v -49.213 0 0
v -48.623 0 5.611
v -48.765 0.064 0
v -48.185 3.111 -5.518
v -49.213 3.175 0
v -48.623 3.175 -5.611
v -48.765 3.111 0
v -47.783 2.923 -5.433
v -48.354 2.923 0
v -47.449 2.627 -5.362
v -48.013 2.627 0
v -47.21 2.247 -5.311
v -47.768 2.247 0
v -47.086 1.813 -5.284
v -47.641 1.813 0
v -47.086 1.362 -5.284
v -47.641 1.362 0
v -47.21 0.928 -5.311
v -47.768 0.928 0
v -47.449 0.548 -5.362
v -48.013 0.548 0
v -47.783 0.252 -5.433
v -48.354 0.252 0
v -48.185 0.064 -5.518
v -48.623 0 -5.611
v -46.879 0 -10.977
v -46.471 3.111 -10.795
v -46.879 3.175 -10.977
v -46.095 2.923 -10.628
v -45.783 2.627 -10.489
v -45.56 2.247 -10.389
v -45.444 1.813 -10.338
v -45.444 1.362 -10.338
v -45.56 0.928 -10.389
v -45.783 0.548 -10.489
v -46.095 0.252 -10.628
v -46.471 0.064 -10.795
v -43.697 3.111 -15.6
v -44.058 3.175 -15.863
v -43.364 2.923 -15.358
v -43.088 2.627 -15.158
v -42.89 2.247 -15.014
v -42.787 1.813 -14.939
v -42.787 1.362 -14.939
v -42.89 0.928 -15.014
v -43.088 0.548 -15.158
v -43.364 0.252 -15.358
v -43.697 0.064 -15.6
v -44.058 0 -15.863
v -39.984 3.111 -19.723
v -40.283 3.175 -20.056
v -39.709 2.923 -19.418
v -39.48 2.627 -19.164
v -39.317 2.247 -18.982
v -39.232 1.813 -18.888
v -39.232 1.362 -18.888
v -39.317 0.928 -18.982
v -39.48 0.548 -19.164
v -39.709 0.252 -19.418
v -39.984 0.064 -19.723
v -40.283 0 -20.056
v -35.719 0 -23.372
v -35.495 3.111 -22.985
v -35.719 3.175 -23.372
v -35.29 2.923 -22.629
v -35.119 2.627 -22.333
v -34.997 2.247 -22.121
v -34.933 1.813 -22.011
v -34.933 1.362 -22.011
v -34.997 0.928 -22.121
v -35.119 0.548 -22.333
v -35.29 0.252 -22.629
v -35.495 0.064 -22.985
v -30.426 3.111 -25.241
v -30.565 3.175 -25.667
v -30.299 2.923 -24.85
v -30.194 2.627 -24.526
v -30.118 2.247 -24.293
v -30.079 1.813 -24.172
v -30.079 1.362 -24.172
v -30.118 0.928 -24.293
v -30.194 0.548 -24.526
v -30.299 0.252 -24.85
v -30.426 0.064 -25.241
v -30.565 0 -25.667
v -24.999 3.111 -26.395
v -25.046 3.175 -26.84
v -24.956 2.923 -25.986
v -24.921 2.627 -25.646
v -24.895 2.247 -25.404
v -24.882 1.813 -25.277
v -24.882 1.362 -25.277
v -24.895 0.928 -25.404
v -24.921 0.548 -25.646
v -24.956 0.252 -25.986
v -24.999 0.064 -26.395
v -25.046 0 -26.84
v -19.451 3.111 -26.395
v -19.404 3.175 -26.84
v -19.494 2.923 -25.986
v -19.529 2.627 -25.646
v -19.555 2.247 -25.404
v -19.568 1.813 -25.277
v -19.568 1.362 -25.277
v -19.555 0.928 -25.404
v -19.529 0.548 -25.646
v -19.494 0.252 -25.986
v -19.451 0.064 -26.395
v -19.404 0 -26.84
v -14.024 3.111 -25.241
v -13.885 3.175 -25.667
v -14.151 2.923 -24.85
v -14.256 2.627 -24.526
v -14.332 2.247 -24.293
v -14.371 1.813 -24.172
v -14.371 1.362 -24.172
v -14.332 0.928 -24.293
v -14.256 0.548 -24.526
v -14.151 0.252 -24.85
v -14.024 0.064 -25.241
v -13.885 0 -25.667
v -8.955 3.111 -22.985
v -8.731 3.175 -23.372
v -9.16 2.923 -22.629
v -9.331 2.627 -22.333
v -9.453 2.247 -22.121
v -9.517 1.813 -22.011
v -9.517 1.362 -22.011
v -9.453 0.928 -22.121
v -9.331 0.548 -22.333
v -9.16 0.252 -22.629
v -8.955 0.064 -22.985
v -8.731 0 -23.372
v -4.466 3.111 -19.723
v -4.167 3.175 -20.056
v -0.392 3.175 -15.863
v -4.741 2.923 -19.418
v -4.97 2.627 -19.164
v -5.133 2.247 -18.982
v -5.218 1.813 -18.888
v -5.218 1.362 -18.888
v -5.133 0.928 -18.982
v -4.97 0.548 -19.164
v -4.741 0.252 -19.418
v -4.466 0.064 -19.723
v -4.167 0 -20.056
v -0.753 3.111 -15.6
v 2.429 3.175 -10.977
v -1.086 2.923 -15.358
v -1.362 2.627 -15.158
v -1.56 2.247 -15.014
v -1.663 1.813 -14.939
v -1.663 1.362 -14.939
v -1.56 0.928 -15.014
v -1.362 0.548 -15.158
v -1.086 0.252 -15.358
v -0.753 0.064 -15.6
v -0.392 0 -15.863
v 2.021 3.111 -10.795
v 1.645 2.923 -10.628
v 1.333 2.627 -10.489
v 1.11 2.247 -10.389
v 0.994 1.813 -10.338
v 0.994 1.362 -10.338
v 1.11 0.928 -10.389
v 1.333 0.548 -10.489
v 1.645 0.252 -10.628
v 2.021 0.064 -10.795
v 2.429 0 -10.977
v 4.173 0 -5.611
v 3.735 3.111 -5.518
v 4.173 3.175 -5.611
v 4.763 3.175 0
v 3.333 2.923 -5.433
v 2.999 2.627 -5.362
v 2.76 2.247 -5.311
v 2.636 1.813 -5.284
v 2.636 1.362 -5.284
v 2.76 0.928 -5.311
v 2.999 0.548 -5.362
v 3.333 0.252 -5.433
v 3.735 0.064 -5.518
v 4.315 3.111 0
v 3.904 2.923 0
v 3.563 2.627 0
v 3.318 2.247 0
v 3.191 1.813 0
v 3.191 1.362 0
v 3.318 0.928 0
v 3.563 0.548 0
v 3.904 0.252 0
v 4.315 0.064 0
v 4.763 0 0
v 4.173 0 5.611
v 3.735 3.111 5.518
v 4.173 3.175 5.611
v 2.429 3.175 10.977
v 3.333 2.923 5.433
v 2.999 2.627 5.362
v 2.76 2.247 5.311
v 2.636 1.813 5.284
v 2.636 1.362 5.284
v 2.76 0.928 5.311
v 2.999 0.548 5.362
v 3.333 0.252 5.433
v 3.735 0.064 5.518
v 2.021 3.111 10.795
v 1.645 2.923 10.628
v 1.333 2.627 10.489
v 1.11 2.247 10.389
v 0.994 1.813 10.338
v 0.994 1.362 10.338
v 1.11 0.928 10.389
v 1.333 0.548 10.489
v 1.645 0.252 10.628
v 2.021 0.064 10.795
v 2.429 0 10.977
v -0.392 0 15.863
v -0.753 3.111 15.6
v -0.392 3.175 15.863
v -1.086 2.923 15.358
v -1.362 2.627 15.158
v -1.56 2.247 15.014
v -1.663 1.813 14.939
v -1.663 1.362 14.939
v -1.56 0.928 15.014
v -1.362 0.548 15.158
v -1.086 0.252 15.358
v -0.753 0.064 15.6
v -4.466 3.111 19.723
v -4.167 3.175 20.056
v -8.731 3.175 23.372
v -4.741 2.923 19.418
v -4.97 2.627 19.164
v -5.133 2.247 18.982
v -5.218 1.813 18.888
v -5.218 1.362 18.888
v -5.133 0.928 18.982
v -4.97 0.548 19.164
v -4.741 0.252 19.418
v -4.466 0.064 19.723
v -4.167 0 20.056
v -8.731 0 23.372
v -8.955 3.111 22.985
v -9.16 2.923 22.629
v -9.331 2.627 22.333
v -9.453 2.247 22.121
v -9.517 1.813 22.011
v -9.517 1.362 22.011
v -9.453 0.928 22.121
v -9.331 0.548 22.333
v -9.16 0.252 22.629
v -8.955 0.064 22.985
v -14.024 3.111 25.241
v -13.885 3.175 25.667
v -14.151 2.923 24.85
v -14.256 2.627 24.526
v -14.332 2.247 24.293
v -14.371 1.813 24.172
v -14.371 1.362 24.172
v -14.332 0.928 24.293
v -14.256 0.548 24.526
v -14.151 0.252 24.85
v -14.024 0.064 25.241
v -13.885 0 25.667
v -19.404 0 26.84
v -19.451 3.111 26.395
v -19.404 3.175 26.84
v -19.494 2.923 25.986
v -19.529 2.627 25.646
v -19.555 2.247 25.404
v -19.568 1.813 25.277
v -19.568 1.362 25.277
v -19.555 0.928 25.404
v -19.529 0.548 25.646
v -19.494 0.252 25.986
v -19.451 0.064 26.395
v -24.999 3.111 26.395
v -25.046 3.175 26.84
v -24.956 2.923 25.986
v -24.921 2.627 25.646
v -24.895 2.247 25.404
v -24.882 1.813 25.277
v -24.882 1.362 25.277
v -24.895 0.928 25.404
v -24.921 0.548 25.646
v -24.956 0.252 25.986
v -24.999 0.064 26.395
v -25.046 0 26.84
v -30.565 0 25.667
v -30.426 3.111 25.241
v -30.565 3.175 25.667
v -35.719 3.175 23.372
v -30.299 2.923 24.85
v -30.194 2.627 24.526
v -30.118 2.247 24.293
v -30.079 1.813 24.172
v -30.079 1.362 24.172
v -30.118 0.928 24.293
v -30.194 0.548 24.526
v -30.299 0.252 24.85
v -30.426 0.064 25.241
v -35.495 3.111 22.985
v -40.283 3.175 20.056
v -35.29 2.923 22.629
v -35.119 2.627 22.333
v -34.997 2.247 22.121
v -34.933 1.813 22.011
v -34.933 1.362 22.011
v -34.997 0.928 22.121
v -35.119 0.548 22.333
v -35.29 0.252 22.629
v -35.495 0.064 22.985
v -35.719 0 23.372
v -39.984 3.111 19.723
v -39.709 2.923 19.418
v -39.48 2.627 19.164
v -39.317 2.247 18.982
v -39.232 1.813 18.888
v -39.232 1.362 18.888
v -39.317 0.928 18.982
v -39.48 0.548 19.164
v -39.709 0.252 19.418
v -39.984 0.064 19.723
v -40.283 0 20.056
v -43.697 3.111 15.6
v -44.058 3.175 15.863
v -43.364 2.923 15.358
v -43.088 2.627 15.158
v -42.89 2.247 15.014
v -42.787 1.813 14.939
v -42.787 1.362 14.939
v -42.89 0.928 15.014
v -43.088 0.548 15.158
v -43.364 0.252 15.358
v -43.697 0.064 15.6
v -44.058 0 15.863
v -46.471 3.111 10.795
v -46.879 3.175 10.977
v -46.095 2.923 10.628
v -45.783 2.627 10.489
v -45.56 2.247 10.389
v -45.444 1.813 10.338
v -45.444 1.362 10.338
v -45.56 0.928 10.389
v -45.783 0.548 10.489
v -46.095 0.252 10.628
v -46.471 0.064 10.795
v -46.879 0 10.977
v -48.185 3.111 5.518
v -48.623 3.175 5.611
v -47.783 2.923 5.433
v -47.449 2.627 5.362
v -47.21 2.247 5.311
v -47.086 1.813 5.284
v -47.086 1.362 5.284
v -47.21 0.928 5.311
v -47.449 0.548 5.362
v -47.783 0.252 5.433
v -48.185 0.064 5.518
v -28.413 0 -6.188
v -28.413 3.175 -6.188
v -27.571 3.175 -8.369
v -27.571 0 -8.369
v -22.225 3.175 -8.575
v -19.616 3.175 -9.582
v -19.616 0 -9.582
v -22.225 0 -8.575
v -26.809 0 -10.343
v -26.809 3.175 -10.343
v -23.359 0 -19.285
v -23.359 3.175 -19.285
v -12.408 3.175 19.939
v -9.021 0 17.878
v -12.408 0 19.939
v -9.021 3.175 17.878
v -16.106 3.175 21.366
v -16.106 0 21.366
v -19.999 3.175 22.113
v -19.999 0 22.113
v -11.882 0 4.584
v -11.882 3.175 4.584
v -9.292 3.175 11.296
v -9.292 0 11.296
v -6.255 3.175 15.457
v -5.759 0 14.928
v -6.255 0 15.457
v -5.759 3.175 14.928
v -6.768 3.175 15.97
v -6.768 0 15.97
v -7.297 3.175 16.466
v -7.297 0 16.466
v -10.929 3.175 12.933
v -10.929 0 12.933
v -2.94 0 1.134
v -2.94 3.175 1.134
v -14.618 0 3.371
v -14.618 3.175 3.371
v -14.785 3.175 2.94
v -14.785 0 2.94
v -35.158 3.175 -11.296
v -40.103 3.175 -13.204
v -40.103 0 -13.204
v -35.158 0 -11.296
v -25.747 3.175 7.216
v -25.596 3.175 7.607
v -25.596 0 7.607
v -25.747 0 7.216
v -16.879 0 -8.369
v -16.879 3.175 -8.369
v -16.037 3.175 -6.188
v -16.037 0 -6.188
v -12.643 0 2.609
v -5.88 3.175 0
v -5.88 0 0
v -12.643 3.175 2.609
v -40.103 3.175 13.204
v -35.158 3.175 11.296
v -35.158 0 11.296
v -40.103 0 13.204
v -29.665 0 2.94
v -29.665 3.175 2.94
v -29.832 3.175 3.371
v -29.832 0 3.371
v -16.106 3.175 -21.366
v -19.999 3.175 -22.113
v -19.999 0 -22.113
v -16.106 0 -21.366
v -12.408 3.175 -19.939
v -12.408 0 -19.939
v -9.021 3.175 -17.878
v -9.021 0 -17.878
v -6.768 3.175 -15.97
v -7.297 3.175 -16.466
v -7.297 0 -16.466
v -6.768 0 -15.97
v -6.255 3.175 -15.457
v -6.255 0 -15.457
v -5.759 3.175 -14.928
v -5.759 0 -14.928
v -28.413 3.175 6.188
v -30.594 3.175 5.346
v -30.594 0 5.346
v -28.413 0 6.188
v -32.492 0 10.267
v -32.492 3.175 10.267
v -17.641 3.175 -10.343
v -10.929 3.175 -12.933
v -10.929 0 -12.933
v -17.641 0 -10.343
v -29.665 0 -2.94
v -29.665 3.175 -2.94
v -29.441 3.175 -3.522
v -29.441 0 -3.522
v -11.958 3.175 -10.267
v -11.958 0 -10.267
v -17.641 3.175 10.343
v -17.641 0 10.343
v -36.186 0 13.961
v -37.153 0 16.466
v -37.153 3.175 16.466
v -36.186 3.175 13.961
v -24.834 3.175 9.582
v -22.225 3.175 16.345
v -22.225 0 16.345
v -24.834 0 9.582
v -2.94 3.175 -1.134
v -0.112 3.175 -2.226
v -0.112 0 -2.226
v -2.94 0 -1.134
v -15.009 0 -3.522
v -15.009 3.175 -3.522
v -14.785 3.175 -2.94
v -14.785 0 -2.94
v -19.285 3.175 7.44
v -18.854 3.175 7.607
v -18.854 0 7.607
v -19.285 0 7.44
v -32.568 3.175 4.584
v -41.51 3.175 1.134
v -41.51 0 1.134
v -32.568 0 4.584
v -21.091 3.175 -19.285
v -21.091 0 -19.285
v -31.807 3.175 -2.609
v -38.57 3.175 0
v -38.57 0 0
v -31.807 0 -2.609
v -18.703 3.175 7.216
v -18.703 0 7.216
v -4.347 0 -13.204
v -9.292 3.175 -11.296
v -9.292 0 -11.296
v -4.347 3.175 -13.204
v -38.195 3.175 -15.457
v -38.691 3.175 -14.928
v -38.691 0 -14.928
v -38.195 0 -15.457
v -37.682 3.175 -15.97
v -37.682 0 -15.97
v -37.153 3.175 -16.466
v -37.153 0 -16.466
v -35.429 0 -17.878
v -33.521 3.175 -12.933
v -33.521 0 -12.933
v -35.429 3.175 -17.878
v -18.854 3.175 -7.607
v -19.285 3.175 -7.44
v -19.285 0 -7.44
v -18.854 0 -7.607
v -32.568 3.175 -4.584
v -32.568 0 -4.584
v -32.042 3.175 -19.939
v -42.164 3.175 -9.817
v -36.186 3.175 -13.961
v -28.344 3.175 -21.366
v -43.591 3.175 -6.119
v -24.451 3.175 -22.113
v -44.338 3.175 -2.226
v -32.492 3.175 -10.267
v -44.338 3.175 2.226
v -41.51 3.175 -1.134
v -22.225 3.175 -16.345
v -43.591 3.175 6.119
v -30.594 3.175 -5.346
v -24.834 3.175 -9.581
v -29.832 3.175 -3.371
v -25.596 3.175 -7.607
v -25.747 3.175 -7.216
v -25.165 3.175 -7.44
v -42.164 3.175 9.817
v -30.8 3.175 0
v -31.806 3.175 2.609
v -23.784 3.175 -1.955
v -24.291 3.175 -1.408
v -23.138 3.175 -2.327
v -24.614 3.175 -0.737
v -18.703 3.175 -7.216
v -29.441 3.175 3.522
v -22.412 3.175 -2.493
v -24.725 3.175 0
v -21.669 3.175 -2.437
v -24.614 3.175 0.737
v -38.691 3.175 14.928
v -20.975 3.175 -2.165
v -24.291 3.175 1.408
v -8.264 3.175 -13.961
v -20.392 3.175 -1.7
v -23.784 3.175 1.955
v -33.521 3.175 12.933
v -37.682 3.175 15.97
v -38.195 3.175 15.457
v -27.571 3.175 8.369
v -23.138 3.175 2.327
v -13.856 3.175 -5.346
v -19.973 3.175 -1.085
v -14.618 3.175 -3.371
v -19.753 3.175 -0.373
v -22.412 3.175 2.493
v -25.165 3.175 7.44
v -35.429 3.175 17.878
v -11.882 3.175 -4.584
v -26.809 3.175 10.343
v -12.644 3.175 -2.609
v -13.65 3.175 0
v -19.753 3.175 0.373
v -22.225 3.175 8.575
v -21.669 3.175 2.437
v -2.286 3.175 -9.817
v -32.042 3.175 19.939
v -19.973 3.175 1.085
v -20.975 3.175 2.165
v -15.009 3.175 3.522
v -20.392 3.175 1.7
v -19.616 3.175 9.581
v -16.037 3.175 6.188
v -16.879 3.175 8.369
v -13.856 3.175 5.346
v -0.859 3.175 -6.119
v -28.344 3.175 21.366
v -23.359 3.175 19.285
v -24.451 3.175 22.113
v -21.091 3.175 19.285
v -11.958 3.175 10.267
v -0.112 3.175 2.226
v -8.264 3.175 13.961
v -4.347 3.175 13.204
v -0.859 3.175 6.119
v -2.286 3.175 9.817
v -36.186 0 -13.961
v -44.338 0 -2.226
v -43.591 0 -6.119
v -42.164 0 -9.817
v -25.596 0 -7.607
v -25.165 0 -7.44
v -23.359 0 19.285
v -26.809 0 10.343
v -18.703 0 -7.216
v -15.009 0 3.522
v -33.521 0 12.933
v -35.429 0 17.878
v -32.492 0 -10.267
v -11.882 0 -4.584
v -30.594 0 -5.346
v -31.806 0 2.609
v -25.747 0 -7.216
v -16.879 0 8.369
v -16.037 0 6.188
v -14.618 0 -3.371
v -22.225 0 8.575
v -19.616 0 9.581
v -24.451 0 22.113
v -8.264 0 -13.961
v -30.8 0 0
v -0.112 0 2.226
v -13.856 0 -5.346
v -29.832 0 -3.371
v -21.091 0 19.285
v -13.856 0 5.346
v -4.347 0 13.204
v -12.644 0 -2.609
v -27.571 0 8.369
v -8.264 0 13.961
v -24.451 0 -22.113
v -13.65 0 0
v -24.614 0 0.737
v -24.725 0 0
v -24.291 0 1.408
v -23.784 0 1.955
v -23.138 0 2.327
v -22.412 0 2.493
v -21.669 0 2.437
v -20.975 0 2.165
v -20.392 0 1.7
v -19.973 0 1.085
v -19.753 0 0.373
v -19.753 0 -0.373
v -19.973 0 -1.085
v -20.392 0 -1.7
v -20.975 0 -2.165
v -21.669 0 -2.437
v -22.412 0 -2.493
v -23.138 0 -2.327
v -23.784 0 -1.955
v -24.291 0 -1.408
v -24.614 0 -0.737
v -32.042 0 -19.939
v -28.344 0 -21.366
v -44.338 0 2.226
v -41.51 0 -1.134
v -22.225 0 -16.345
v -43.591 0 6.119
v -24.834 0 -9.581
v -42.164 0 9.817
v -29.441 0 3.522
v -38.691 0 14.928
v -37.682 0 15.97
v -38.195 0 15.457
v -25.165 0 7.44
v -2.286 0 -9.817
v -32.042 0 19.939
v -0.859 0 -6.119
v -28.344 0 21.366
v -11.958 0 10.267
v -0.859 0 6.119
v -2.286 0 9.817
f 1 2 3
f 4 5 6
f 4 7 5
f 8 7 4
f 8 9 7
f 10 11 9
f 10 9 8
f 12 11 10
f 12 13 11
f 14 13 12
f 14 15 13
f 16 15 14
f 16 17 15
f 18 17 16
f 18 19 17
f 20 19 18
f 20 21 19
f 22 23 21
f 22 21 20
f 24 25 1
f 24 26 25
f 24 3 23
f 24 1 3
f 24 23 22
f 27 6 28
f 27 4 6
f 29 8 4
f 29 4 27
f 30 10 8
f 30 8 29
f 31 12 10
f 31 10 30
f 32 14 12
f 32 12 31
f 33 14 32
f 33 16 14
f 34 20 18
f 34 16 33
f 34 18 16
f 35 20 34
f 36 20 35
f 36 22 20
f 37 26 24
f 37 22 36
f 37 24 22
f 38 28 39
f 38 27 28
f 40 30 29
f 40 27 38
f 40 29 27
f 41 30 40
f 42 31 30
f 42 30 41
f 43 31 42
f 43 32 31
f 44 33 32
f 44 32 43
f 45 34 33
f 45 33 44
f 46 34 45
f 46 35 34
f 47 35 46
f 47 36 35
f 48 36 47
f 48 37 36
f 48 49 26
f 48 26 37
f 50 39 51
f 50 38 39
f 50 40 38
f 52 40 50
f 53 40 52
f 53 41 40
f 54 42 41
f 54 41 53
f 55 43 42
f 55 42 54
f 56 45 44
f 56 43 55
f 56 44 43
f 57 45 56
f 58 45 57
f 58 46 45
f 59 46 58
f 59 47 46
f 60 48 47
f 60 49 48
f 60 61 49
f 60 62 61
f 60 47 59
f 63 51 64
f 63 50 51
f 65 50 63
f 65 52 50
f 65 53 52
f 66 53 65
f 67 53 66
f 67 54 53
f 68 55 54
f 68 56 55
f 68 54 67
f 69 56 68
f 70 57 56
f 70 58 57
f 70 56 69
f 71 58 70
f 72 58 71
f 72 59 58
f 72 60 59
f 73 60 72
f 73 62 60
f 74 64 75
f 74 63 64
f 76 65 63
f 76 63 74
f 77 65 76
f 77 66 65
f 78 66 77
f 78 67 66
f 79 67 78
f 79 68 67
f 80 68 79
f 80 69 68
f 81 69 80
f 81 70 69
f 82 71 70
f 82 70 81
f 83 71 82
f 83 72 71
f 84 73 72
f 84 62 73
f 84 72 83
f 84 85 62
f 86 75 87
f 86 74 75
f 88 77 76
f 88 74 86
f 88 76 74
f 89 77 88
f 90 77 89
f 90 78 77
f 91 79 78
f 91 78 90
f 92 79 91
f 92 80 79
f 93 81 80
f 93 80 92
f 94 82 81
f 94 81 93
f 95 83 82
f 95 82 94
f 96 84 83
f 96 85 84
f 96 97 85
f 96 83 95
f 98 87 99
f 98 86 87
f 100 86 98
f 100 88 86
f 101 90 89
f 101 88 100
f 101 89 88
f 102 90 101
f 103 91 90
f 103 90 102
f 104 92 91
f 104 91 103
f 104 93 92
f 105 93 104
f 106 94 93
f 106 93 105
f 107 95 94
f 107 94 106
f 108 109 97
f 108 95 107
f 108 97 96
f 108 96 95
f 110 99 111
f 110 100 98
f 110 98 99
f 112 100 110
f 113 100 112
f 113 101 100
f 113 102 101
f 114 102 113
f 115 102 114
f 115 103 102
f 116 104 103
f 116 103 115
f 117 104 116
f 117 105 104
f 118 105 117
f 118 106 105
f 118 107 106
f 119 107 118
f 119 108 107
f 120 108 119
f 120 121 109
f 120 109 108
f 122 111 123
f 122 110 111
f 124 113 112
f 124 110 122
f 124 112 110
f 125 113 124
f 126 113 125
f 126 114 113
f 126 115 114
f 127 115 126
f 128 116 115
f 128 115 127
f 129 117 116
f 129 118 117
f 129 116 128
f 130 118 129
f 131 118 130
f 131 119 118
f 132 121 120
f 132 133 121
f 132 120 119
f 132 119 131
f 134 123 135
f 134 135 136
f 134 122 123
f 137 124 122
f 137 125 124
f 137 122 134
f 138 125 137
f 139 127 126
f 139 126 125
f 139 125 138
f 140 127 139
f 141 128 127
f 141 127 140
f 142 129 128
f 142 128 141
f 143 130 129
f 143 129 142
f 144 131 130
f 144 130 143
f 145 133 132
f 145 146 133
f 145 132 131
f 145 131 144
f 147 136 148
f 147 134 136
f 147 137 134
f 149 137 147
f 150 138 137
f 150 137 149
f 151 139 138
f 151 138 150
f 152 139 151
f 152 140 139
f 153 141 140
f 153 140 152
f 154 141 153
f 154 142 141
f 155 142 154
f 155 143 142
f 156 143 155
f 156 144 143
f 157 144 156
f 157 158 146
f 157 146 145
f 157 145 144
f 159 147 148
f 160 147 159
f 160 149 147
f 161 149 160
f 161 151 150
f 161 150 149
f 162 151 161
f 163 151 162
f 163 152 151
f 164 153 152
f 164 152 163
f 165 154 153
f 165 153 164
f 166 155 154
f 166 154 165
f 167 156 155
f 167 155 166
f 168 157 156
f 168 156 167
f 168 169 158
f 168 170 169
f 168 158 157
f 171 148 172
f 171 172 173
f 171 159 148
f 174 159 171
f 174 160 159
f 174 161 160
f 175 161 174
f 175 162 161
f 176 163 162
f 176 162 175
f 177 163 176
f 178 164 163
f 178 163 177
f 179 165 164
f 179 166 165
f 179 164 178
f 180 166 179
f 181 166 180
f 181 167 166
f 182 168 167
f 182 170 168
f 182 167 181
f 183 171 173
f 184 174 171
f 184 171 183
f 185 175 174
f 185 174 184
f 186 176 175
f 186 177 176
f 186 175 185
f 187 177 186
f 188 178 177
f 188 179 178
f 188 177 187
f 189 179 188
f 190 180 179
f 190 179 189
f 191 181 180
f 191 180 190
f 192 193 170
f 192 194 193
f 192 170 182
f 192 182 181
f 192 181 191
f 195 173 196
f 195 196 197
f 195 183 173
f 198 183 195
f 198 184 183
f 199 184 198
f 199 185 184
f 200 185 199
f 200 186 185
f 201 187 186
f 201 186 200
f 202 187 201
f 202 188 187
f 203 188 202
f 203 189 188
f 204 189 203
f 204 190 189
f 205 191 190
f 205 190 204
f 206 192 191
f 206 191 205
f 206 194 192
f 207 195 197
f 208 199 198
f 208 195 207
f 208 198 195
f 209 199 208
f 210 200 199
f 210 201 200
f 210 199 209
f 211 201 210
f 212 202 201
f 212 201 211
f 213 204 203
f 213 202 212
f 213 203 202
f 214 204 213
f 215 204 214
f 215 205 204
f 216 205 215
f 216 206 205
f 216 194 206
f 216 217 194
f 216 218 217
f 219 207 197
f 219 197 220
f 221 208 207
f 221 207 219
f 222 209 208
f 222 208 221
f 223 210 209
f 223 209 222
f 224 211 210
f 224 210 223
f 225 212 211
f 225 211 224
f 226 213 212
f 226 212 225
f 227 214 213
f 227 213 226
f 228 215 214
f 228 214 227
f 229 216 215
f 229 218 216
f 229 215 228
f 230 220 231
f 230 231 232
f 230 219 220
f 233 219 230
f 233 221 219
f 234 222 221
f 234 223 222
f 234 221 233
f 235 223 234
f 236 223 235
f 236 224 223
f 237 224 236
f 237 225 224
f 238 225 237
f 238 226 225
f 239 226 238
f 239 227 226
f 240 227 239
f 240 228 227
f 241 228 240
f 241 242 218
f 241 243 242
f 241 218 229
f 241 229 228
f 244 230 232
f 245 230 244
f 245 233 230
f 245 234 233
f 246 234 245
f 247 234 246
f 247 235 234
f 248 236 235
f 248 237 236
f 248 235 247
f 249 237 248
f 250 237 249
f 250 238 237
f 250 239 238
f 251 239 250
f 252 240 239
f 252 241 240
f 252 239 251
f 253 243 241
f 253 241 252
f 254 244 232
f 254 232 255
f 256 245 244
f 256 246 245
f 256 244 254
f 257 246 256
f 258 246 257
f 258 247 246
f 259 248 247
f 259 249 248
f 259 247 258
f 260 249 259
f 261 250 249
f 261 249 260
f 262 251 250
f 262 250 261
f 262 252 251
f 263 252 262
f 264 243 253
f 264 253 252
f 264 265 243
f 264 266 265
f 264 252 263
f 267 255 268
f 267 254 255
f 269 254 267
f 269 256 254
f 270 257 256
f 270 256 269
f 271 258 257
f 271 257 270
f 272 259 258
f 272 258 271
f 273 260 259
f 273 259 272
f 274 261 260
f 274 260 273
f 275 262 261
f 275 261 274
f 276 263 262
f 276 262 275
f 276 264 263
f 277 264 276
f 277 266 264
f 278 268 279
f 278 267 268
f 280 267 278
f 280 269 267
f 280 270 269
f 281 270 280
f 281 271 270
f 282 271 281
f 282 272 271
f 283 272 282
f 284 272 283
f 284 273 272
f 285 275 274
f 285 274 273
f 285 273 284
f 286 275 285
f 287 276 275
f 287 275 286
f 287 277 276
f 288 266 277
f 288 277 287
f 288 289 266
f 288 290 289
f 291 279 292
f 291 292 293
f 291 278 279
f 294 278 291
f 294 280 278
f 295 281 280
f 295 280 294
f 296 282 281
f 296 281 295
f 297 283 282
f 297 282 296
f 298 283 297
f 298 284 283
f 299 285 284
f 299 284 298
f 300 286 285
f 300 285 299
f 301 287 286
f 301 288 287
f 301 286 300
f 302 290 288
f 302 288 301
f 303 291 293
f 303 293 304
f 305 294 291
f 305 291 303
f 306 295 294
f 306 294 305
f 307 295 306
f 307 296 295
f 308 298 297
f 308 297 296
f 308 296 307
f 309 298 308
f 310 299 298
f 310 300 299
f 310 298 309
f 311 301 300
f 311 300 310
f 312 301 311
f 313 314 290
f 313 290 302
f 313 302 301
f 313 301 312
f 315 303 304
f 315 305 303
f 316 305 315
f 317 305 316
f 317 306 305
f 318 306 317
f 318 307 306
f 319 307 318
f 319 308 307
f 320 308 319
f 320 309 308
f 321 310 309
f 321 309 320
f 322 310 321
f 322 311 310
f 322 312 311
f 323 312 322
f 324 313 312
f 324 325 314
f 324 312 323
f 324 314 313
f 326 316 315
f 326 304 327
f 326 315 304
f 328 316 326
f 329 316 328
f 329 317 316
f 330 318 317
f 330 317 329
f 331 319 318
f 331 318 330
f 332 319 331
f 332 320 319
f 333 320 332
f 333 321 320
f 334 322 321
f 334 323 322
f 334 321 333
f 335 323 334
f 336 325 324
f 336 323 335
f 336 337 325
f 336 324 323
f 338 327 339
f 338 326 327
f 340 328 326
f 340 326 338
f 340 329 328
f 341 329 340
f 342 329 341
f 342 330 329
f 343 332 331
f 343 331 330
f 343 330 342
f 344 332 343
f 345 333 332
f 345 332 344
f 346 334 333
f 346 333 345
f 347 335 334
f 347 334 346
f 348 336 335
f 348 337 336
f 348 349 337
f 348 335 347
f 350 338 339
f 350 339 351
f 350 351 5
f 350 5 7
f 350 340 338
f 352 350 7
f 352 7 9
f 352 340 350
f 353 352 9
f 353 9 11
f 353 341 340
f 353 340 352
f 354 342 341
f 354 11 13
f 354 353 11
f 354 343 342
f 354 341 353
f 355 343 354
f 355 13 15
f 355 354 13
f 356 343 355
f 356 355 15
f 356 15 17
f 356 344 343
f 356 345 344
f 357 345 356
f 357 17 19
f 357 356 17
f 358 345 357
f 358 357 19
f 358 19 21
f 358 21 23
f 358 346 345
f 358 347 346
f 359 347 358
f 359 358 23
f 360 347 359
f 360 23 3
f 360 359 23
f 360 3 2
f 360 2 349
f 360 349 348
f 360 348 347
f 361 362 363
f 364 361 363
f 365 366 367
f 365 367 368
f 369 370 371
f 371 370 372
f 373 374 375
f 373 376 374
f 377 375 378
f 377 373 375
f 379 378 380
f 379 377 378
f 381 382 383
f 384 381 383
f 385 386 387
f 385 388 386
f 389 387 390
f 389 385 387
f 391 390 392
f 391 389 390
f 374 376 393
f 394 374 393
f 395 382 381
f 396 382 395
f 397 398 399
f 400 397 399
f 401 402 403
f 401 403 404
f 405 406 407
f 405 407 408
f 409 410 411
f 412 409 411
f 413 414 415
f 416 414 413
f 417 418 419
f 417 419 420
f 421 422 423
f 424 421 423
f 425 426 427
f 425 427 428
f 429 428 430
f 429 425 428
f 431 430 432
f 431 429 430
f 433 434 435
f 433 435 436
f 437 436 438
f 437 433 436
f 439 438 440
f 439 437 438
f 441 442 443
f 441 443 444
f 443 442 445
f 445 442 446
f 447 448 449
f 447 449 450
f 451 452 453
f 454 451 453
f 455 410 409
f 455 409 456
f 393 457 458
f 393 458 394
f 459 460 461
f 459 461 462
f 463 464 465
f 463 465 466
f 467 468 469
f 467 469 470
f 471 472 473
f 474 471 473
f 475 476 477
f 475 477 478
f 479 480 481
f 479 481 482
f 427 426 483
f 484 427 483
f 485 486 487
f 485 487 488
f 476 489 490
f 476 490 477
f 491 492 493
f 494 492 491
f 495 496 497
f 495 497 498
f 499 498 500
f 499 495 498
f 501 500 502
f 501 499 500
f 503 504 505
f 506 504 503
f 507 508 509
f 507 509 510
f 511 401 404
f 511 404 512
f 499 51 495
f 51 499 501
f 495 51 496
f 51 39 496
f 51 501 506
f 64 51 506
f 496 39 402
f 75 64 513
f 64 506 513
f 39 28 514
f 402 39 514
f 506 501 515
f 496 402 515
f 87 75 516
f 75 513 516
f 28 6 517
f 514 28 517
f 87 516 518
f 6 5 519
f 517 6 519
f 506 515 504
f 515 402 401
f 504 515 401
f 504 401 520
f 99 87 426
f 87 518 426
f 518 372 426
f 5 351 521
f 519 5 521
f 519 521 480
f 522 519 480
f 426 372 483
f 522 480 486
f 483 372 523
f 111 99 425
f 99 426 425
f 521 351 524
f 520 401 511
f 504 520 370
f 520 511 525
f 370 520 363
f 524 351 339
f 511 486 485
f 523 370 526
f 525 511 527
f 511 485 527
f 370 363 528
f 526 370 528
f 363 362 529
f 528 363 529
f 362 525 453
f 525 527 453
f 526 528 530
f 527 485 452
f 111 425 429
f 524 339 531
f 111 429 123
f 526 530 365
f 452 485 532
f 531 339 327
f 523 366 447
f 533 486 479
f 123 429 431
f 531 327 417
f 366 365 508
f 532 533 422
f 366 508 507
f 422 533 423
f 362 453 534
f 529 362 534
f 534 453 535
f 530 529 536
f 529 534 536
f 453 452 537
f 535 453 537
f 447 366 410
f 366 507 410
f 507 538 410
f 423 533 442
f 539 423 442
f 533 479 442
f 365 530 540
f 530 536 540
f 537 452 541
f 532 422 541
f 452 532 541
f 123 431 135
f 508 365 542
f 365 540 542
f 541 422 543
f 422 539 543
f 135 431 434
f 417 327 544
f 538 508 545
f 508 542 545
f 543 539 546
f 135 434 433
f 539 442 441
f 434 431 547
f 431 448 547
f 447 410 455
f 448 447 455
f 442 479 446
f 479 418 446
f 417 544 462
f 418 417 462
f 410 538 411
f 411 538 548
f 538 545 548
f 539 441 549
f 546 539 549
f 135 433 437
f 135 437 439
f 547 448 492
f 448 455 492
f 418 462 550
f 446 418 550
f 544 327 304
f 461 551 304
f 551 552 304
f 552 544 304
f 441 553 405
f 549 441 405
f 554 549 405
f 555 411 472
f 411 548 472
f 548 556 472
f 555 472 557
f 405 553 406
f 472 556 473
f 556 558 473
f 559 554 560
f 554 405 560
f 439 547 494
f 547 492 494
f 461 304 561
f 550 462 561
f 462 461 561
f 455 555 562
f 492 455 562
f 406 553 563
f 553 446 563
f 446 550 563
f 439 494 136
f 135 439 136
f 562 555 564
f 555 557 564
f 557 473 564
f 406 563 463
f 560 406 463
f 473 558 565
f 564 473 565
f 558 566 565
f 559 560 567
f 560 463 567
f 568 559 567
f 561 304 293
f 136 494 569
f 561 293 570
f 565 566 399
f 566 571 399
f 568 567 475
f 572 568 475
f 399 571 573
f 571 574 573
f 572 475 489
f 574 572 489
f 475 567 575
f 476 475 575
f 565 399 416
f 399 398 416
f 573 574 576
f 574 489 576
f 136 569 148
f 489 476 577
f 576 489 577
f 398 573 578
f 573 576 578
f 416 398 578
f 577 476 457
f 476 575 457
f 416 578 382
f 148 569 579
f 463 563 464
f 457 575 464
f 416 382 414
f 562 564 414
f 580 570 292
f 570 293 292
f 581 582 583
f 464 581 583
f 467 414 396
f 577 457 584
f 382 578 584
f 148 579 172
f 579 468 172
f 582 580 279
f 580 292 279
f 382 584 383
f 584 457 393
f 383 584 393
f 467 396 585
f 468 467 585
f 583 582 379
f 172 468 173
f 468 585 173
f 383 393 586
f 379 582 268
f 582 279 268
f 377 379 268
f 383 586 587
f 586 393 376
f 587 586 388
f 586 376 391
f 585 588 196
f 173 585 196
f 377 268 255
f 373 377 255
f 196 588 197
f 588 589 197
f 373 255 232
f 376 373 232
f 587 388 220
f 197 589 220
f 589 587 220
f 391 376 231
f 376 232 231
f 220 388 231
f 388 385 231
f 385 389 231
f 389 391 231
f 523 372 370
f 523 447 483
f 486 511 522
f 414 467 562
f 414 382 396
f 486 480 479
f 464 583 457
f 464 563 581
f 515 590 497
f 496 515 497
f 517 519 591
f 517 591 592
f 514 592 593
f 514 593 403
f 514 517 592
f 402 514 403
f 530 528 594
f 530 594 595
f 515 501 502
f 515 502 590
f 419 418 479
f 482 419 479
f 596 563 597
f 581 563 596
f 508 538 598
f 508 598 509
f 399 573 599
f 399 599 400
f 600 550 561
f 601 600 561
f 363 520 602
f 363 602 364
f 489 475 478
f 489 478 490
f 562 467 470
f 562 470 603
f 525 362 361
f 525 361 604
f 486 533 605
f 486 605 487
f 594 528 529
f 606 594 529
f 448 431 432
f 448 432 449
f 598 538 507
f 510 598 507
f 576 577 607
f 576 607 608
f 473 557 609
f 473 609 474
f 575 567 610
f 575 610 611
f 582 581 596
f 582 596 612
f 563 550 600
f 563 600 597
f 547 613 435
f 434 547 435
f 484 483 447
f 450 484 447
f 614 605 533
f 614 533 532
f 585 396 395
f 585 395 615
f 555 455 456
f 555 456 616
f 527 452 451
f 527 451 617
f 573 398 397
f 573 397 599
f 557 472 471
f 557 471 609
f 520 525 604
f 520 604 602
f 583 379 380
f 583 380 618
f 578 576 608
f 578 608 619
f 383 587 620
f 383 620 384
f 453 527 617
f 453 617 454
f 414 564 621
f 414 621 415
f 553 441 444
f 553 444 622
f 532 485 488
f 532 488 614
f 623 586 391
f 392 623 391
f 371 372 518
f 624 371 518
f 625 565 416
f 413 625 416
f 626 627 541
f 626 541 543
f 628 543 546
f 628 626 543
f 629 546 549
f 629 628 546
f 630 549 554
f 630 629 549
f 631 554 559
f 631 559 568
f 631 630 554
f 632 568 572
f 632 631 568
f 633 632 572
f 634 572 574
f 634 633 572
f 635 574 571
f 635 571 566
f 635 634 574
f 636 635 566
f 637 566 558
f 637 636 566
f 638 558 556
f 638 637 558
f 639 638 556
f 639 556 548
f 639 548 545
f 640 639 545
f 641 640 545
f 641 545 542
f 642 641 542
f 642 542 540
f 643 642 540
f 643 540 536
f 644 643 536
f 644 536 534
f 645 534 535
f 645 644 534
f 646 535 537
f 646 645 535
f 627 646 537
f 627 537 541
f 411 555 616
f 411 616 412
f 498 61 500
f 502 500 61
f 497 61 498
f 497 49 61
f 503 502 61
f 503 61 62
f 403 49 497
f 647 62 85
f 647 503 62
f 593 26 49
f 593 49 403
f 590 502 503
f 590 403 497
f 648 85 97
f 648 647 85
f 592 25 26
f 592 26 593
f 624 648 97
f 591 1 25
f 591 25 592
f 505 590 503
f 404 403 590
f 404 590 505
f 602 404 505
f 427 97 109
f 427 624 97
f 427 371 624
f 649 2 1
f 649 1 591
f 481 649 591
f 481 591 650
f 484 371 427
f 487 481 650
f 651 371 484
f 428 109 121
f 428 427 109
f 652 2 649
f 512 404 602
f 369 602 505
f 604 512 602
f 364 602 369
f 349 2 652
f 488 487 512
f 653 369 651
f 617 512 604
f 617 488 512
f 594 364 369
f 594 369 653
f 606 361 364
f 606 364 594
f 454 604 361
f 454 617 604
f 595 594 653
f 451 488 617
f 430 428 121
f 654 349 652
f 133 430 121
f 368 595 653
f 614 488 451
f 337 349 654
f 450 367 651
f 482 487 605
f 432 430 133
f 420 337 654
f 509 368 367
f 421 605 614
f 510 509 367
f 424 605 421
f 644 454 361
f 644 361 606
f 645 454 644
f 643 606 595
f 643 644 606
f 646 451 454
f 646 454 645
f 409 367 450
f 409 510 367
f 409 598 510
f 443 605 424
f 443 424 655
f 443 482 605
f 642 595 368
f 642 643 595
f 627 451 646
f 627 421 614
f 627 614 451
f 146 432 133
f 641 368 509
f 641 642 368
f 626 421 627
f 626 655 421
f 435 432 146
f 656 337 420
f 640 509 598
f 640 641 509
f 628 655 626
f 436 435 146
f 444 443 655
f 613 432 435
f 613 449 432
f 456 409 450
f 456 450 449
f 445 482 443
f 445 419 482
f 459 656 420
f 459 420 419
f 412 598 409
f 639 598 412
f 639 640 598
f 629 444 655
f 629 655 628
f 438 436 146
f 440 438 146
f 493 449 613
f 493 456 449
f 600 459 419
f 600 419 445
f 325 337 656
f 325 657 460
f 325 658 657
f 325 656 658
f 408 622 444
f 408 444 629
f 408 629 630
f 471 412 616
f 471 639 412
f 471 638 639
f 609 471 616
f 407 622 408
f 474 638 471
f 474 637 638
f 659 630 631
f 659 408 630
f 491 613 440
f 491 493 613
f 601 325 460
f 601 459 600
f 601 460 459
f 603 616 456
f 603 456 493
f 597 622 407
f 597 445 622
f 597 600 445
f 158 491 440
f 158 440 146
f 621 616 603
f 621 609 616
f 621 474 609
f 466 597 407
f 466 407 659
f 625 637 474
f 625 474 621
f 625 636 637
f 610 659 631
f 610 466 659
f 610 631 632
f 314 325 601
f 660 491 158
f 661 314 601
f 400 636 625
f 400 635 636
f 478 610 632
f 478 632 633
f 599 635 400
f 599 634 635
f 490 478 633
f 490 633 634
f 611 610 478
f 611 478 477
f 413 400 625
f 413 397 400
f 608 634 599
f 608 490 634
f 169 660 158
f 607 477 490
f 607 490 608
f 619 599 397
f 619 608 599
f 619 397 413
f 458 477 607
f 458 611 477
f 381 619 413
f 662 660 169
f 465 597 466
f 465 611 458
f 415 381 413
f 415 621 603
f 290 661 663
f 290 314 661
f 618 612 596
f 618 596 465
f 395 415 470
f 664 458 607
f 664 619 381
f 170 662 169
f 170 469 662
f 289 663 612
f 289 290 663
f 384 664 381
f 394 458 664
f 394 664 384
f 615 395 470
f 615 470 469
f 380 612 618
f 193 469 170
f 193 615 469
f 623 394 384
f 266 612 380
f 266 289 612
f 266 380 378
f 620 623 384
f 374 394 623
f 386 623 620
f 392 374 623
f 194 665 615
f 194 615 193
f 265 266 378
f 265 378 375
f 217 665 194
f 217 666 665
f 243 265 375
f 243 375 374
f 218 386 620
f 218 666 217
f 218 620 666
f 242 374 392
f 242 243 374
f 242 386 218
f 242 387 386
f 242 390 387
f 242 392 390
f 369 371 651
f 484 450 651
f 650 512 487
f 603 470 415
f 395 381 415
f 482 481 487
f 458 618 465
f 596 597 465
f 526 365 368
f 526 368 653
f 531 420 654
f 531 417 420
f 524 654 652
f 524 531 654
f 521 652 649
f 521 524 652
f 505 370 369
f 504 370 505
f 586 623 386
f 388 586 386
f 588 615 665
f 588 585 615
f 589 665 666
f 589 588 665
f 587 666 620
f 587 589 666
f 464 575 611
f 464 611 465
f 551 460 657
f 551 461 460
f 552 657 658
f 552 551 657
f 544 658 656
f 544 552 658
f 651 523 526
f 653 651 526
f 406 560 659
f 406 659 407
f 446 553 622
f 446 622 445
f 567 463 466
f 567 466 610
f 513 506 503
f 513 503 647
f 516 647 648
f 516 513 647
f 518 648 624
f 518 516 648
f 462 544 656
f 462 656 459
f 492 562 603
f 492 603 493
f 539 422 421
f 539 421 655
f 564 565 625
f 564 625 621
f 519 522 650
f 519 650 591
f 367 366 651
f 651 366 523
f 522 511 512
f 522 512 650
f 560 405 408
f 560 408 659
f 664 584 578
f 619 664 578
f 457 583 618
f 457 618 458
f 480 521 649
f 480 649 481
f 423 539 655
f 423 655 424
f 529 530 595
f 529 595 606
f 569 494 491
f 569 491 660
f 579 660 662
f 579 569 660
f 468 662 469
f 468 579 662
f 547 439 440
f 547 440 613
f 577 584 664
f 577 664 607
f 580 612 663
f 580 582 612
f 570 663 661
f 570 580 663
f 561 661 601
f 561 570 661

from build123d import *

# Parameters (mm, degrees)
SKETCH2_R           = 8
SKETCH2_R_2         = 2.5
BOSS_EXTRUDE1_DEPTH = 3.175
BOSS_EXTRUDE2_START = -3.175
BOSS_EXTRUDE2_DEPTH = 3.175


with BuildPart() as part:
    # Sketch1 → Revolve2 (revolve)
    with BuildSketch(Plane.XY, mode=Mode.PRIVATE) as revolve2_sk:
        with BuildLine():
            Line((0, 0), (0, 3.175))
            Line((0, 3.175), (3.175, 3.175))
            Line((3.175, 3.175), (4.7625, 3.175))
            ThreePointArc((4.7625, 3.175), (3.175, 1.5875), (4.7625, 0))
            Line((4.7625, 0), (3.175, 0))
            Line((3.175, 0), (0, 0))
        make_face()
    revolve(revolve2_sk.sketch.rotate(Axis((-22.225, 12.769143385, 0), (0, -1, 0)), 180), axis=Axis((-22.225, 12.769143385, 0), (0, -1, 0)))



with BuildPart() as body_2:
    # Sketch2 → Boss-Extrude1 (new body)
    with BuildSketch(Plane(origin=(0, 0, 0), x_dir=(1, 0, 0), z_dir=(0, 1, 0))):
        with Locations(Location((-22.225, 0, 0), (0, 0, 180))):
            Circle(SKETCH2_R)
        with Locations(Location((-22.225, 0, 0), (0, 0, 180))):
            Circle(SKETCH2_R_2, mode=Mode.SUBTRACT)
    extrude(amount=BOSS_EXTRUDE1_DEPTH)


with BuildPart() as part_1:
    add(part.part)

    add(body_2.part)  # Boss-Extrude2 merges body 2
    # Sketch4 → Boss-Extrude2 (add)
    with BuildSketch(Plane.XZ.offset(BOSS_EXTRUDE2_START)):
        with BuildLine():
            Line((-22.224995499, -16.344642731), (-35.42857082, 17.877817054))
            ThreePointArc((-35.42857082, 17.877817054), (-36.308247437, 17.19339311), (-37.152505221, 16.465728434))
            Line((-37.152505221, 16.465728434), (-23.359368534, -19.284820497))
            Line((-23.359368534, -19.284820497), (-24.450638712, -22.113280112))
            ThreePointArc((-24.450638712, -22.113280112), (-22.225000553, -22.225), (-19.999362388, -22.113280223))
            Line((-19.999362388, -22.113280223), (-21.090626965, -19.284822234))
            Line((-21.090626965, -19.284822234), (-7.297444367, 16.465682732))
            ThreePointArc((-7.297444367, 16.465682732), (-8.141700351, 17.193350342), (-9.021375334, 17.877777286))
            Line((-9.021375334, 17.877777286), (-22.224995499, -16.344642731))
        make_face()
        with BuildLine():
            Line((-41.509820497, 1.134368534), (-5.759271566, 14.927505221))
            ThreePointArc((-5.759271566, 14.927505221), (-5.03160689, 14.083247437), (-4.347182946, 13.20357082))
            Line((-4.347182946, 13.20357082), (-38.569642731, -4.501e-06))
            Line((-38.569642731, -4.501e-06), (-4.347222714, -13.203624666))
            ThreePointArc((-4.347222714, -13.203624666), (-5.031649658, -14.083299649), (-5.759317268, -14.927555633))
            Line((-5.759317268, -14.927555633), (-41.509822234, -1.134373035))
            Line((-41.509822234, -1.134373035), (-44.338280223, -2.225637612))
            ThreePointArc((-44.338280223, -2.225637612), (-44.45, 5.53e-07), (-44.338280112, 2.225638712))
            Line((-44.338280112, 2.225638712), (-41.509820497, 1.134368534))
        make_face()
        with BuildLine():
            Line((-21.090631466, 19.284820497), (-7.297494779, -16.465728434))
            ThreePointArc((-7.297494779, -16.465728434), (-8.141752563, -17.19339311), (-9.02142918, -17.877817054))
            Line((-9.02142918, -17.877817054), (-22.225004501, 16.344642731))
            Line((-22.225004501, 16.344642731), (-35.428624666, -17.877777286))
            ThreePointArc((-35.428624666, -17.877777286), (-36.308299649, -17.193350342), (-37.152555633, -16.465682732))
            Line((-37.152555633, -16.465682732), (-23.359373035, 19.284822234))
            Line((-23.359373035, 19.284822234), (-24.450637612, 22.113280223))
            ThreePointArc((-24.450637612, 22.113280223), (-22.224999447, 22.225), (-19.999361288, 22.113280112))
            Line((-19.999361288, 22.113280112), (-21.090631466, 19.284820497))
        make_face()
        with BuildLine():
            Line((-2.940179503, -1.134368534), (-38.690728434, -14.927505221))
            ThreePointArc((-38.690728434, -14.927505221), (-39.41839311, -14.083247437), (-40.102817054, -13.20357082))
            Line((-40.102817054, -13.20357082), (-5.880357269, 4.501e-06))
            Line((-5.880357269, 4.501e-06), (-40.102777286, 13.203624666))
            ThreePointArc((-40.102777286, 13.203624666), (-39.418350342, 14.083299649), (-38.690682732, 14.927555633))
            Line((-38.690682732, 14.927555633), (-2.940177766, 1.134373035))
            Line((-2.940177766, 1.134373035), (-0.111719777, 2.225637612))
            ThreePointArc((-0.111719777, 2.225637612), (0, -5.53e-07), (-0.111719888, -2.225638712))
            Line((-0.111719888, -2.225638712), (-2.940179503, -1.134368534))
        make_face()
    extrude(amount=BOSS_EXTRUDE2_DEPTH)


solid = part_1.part
